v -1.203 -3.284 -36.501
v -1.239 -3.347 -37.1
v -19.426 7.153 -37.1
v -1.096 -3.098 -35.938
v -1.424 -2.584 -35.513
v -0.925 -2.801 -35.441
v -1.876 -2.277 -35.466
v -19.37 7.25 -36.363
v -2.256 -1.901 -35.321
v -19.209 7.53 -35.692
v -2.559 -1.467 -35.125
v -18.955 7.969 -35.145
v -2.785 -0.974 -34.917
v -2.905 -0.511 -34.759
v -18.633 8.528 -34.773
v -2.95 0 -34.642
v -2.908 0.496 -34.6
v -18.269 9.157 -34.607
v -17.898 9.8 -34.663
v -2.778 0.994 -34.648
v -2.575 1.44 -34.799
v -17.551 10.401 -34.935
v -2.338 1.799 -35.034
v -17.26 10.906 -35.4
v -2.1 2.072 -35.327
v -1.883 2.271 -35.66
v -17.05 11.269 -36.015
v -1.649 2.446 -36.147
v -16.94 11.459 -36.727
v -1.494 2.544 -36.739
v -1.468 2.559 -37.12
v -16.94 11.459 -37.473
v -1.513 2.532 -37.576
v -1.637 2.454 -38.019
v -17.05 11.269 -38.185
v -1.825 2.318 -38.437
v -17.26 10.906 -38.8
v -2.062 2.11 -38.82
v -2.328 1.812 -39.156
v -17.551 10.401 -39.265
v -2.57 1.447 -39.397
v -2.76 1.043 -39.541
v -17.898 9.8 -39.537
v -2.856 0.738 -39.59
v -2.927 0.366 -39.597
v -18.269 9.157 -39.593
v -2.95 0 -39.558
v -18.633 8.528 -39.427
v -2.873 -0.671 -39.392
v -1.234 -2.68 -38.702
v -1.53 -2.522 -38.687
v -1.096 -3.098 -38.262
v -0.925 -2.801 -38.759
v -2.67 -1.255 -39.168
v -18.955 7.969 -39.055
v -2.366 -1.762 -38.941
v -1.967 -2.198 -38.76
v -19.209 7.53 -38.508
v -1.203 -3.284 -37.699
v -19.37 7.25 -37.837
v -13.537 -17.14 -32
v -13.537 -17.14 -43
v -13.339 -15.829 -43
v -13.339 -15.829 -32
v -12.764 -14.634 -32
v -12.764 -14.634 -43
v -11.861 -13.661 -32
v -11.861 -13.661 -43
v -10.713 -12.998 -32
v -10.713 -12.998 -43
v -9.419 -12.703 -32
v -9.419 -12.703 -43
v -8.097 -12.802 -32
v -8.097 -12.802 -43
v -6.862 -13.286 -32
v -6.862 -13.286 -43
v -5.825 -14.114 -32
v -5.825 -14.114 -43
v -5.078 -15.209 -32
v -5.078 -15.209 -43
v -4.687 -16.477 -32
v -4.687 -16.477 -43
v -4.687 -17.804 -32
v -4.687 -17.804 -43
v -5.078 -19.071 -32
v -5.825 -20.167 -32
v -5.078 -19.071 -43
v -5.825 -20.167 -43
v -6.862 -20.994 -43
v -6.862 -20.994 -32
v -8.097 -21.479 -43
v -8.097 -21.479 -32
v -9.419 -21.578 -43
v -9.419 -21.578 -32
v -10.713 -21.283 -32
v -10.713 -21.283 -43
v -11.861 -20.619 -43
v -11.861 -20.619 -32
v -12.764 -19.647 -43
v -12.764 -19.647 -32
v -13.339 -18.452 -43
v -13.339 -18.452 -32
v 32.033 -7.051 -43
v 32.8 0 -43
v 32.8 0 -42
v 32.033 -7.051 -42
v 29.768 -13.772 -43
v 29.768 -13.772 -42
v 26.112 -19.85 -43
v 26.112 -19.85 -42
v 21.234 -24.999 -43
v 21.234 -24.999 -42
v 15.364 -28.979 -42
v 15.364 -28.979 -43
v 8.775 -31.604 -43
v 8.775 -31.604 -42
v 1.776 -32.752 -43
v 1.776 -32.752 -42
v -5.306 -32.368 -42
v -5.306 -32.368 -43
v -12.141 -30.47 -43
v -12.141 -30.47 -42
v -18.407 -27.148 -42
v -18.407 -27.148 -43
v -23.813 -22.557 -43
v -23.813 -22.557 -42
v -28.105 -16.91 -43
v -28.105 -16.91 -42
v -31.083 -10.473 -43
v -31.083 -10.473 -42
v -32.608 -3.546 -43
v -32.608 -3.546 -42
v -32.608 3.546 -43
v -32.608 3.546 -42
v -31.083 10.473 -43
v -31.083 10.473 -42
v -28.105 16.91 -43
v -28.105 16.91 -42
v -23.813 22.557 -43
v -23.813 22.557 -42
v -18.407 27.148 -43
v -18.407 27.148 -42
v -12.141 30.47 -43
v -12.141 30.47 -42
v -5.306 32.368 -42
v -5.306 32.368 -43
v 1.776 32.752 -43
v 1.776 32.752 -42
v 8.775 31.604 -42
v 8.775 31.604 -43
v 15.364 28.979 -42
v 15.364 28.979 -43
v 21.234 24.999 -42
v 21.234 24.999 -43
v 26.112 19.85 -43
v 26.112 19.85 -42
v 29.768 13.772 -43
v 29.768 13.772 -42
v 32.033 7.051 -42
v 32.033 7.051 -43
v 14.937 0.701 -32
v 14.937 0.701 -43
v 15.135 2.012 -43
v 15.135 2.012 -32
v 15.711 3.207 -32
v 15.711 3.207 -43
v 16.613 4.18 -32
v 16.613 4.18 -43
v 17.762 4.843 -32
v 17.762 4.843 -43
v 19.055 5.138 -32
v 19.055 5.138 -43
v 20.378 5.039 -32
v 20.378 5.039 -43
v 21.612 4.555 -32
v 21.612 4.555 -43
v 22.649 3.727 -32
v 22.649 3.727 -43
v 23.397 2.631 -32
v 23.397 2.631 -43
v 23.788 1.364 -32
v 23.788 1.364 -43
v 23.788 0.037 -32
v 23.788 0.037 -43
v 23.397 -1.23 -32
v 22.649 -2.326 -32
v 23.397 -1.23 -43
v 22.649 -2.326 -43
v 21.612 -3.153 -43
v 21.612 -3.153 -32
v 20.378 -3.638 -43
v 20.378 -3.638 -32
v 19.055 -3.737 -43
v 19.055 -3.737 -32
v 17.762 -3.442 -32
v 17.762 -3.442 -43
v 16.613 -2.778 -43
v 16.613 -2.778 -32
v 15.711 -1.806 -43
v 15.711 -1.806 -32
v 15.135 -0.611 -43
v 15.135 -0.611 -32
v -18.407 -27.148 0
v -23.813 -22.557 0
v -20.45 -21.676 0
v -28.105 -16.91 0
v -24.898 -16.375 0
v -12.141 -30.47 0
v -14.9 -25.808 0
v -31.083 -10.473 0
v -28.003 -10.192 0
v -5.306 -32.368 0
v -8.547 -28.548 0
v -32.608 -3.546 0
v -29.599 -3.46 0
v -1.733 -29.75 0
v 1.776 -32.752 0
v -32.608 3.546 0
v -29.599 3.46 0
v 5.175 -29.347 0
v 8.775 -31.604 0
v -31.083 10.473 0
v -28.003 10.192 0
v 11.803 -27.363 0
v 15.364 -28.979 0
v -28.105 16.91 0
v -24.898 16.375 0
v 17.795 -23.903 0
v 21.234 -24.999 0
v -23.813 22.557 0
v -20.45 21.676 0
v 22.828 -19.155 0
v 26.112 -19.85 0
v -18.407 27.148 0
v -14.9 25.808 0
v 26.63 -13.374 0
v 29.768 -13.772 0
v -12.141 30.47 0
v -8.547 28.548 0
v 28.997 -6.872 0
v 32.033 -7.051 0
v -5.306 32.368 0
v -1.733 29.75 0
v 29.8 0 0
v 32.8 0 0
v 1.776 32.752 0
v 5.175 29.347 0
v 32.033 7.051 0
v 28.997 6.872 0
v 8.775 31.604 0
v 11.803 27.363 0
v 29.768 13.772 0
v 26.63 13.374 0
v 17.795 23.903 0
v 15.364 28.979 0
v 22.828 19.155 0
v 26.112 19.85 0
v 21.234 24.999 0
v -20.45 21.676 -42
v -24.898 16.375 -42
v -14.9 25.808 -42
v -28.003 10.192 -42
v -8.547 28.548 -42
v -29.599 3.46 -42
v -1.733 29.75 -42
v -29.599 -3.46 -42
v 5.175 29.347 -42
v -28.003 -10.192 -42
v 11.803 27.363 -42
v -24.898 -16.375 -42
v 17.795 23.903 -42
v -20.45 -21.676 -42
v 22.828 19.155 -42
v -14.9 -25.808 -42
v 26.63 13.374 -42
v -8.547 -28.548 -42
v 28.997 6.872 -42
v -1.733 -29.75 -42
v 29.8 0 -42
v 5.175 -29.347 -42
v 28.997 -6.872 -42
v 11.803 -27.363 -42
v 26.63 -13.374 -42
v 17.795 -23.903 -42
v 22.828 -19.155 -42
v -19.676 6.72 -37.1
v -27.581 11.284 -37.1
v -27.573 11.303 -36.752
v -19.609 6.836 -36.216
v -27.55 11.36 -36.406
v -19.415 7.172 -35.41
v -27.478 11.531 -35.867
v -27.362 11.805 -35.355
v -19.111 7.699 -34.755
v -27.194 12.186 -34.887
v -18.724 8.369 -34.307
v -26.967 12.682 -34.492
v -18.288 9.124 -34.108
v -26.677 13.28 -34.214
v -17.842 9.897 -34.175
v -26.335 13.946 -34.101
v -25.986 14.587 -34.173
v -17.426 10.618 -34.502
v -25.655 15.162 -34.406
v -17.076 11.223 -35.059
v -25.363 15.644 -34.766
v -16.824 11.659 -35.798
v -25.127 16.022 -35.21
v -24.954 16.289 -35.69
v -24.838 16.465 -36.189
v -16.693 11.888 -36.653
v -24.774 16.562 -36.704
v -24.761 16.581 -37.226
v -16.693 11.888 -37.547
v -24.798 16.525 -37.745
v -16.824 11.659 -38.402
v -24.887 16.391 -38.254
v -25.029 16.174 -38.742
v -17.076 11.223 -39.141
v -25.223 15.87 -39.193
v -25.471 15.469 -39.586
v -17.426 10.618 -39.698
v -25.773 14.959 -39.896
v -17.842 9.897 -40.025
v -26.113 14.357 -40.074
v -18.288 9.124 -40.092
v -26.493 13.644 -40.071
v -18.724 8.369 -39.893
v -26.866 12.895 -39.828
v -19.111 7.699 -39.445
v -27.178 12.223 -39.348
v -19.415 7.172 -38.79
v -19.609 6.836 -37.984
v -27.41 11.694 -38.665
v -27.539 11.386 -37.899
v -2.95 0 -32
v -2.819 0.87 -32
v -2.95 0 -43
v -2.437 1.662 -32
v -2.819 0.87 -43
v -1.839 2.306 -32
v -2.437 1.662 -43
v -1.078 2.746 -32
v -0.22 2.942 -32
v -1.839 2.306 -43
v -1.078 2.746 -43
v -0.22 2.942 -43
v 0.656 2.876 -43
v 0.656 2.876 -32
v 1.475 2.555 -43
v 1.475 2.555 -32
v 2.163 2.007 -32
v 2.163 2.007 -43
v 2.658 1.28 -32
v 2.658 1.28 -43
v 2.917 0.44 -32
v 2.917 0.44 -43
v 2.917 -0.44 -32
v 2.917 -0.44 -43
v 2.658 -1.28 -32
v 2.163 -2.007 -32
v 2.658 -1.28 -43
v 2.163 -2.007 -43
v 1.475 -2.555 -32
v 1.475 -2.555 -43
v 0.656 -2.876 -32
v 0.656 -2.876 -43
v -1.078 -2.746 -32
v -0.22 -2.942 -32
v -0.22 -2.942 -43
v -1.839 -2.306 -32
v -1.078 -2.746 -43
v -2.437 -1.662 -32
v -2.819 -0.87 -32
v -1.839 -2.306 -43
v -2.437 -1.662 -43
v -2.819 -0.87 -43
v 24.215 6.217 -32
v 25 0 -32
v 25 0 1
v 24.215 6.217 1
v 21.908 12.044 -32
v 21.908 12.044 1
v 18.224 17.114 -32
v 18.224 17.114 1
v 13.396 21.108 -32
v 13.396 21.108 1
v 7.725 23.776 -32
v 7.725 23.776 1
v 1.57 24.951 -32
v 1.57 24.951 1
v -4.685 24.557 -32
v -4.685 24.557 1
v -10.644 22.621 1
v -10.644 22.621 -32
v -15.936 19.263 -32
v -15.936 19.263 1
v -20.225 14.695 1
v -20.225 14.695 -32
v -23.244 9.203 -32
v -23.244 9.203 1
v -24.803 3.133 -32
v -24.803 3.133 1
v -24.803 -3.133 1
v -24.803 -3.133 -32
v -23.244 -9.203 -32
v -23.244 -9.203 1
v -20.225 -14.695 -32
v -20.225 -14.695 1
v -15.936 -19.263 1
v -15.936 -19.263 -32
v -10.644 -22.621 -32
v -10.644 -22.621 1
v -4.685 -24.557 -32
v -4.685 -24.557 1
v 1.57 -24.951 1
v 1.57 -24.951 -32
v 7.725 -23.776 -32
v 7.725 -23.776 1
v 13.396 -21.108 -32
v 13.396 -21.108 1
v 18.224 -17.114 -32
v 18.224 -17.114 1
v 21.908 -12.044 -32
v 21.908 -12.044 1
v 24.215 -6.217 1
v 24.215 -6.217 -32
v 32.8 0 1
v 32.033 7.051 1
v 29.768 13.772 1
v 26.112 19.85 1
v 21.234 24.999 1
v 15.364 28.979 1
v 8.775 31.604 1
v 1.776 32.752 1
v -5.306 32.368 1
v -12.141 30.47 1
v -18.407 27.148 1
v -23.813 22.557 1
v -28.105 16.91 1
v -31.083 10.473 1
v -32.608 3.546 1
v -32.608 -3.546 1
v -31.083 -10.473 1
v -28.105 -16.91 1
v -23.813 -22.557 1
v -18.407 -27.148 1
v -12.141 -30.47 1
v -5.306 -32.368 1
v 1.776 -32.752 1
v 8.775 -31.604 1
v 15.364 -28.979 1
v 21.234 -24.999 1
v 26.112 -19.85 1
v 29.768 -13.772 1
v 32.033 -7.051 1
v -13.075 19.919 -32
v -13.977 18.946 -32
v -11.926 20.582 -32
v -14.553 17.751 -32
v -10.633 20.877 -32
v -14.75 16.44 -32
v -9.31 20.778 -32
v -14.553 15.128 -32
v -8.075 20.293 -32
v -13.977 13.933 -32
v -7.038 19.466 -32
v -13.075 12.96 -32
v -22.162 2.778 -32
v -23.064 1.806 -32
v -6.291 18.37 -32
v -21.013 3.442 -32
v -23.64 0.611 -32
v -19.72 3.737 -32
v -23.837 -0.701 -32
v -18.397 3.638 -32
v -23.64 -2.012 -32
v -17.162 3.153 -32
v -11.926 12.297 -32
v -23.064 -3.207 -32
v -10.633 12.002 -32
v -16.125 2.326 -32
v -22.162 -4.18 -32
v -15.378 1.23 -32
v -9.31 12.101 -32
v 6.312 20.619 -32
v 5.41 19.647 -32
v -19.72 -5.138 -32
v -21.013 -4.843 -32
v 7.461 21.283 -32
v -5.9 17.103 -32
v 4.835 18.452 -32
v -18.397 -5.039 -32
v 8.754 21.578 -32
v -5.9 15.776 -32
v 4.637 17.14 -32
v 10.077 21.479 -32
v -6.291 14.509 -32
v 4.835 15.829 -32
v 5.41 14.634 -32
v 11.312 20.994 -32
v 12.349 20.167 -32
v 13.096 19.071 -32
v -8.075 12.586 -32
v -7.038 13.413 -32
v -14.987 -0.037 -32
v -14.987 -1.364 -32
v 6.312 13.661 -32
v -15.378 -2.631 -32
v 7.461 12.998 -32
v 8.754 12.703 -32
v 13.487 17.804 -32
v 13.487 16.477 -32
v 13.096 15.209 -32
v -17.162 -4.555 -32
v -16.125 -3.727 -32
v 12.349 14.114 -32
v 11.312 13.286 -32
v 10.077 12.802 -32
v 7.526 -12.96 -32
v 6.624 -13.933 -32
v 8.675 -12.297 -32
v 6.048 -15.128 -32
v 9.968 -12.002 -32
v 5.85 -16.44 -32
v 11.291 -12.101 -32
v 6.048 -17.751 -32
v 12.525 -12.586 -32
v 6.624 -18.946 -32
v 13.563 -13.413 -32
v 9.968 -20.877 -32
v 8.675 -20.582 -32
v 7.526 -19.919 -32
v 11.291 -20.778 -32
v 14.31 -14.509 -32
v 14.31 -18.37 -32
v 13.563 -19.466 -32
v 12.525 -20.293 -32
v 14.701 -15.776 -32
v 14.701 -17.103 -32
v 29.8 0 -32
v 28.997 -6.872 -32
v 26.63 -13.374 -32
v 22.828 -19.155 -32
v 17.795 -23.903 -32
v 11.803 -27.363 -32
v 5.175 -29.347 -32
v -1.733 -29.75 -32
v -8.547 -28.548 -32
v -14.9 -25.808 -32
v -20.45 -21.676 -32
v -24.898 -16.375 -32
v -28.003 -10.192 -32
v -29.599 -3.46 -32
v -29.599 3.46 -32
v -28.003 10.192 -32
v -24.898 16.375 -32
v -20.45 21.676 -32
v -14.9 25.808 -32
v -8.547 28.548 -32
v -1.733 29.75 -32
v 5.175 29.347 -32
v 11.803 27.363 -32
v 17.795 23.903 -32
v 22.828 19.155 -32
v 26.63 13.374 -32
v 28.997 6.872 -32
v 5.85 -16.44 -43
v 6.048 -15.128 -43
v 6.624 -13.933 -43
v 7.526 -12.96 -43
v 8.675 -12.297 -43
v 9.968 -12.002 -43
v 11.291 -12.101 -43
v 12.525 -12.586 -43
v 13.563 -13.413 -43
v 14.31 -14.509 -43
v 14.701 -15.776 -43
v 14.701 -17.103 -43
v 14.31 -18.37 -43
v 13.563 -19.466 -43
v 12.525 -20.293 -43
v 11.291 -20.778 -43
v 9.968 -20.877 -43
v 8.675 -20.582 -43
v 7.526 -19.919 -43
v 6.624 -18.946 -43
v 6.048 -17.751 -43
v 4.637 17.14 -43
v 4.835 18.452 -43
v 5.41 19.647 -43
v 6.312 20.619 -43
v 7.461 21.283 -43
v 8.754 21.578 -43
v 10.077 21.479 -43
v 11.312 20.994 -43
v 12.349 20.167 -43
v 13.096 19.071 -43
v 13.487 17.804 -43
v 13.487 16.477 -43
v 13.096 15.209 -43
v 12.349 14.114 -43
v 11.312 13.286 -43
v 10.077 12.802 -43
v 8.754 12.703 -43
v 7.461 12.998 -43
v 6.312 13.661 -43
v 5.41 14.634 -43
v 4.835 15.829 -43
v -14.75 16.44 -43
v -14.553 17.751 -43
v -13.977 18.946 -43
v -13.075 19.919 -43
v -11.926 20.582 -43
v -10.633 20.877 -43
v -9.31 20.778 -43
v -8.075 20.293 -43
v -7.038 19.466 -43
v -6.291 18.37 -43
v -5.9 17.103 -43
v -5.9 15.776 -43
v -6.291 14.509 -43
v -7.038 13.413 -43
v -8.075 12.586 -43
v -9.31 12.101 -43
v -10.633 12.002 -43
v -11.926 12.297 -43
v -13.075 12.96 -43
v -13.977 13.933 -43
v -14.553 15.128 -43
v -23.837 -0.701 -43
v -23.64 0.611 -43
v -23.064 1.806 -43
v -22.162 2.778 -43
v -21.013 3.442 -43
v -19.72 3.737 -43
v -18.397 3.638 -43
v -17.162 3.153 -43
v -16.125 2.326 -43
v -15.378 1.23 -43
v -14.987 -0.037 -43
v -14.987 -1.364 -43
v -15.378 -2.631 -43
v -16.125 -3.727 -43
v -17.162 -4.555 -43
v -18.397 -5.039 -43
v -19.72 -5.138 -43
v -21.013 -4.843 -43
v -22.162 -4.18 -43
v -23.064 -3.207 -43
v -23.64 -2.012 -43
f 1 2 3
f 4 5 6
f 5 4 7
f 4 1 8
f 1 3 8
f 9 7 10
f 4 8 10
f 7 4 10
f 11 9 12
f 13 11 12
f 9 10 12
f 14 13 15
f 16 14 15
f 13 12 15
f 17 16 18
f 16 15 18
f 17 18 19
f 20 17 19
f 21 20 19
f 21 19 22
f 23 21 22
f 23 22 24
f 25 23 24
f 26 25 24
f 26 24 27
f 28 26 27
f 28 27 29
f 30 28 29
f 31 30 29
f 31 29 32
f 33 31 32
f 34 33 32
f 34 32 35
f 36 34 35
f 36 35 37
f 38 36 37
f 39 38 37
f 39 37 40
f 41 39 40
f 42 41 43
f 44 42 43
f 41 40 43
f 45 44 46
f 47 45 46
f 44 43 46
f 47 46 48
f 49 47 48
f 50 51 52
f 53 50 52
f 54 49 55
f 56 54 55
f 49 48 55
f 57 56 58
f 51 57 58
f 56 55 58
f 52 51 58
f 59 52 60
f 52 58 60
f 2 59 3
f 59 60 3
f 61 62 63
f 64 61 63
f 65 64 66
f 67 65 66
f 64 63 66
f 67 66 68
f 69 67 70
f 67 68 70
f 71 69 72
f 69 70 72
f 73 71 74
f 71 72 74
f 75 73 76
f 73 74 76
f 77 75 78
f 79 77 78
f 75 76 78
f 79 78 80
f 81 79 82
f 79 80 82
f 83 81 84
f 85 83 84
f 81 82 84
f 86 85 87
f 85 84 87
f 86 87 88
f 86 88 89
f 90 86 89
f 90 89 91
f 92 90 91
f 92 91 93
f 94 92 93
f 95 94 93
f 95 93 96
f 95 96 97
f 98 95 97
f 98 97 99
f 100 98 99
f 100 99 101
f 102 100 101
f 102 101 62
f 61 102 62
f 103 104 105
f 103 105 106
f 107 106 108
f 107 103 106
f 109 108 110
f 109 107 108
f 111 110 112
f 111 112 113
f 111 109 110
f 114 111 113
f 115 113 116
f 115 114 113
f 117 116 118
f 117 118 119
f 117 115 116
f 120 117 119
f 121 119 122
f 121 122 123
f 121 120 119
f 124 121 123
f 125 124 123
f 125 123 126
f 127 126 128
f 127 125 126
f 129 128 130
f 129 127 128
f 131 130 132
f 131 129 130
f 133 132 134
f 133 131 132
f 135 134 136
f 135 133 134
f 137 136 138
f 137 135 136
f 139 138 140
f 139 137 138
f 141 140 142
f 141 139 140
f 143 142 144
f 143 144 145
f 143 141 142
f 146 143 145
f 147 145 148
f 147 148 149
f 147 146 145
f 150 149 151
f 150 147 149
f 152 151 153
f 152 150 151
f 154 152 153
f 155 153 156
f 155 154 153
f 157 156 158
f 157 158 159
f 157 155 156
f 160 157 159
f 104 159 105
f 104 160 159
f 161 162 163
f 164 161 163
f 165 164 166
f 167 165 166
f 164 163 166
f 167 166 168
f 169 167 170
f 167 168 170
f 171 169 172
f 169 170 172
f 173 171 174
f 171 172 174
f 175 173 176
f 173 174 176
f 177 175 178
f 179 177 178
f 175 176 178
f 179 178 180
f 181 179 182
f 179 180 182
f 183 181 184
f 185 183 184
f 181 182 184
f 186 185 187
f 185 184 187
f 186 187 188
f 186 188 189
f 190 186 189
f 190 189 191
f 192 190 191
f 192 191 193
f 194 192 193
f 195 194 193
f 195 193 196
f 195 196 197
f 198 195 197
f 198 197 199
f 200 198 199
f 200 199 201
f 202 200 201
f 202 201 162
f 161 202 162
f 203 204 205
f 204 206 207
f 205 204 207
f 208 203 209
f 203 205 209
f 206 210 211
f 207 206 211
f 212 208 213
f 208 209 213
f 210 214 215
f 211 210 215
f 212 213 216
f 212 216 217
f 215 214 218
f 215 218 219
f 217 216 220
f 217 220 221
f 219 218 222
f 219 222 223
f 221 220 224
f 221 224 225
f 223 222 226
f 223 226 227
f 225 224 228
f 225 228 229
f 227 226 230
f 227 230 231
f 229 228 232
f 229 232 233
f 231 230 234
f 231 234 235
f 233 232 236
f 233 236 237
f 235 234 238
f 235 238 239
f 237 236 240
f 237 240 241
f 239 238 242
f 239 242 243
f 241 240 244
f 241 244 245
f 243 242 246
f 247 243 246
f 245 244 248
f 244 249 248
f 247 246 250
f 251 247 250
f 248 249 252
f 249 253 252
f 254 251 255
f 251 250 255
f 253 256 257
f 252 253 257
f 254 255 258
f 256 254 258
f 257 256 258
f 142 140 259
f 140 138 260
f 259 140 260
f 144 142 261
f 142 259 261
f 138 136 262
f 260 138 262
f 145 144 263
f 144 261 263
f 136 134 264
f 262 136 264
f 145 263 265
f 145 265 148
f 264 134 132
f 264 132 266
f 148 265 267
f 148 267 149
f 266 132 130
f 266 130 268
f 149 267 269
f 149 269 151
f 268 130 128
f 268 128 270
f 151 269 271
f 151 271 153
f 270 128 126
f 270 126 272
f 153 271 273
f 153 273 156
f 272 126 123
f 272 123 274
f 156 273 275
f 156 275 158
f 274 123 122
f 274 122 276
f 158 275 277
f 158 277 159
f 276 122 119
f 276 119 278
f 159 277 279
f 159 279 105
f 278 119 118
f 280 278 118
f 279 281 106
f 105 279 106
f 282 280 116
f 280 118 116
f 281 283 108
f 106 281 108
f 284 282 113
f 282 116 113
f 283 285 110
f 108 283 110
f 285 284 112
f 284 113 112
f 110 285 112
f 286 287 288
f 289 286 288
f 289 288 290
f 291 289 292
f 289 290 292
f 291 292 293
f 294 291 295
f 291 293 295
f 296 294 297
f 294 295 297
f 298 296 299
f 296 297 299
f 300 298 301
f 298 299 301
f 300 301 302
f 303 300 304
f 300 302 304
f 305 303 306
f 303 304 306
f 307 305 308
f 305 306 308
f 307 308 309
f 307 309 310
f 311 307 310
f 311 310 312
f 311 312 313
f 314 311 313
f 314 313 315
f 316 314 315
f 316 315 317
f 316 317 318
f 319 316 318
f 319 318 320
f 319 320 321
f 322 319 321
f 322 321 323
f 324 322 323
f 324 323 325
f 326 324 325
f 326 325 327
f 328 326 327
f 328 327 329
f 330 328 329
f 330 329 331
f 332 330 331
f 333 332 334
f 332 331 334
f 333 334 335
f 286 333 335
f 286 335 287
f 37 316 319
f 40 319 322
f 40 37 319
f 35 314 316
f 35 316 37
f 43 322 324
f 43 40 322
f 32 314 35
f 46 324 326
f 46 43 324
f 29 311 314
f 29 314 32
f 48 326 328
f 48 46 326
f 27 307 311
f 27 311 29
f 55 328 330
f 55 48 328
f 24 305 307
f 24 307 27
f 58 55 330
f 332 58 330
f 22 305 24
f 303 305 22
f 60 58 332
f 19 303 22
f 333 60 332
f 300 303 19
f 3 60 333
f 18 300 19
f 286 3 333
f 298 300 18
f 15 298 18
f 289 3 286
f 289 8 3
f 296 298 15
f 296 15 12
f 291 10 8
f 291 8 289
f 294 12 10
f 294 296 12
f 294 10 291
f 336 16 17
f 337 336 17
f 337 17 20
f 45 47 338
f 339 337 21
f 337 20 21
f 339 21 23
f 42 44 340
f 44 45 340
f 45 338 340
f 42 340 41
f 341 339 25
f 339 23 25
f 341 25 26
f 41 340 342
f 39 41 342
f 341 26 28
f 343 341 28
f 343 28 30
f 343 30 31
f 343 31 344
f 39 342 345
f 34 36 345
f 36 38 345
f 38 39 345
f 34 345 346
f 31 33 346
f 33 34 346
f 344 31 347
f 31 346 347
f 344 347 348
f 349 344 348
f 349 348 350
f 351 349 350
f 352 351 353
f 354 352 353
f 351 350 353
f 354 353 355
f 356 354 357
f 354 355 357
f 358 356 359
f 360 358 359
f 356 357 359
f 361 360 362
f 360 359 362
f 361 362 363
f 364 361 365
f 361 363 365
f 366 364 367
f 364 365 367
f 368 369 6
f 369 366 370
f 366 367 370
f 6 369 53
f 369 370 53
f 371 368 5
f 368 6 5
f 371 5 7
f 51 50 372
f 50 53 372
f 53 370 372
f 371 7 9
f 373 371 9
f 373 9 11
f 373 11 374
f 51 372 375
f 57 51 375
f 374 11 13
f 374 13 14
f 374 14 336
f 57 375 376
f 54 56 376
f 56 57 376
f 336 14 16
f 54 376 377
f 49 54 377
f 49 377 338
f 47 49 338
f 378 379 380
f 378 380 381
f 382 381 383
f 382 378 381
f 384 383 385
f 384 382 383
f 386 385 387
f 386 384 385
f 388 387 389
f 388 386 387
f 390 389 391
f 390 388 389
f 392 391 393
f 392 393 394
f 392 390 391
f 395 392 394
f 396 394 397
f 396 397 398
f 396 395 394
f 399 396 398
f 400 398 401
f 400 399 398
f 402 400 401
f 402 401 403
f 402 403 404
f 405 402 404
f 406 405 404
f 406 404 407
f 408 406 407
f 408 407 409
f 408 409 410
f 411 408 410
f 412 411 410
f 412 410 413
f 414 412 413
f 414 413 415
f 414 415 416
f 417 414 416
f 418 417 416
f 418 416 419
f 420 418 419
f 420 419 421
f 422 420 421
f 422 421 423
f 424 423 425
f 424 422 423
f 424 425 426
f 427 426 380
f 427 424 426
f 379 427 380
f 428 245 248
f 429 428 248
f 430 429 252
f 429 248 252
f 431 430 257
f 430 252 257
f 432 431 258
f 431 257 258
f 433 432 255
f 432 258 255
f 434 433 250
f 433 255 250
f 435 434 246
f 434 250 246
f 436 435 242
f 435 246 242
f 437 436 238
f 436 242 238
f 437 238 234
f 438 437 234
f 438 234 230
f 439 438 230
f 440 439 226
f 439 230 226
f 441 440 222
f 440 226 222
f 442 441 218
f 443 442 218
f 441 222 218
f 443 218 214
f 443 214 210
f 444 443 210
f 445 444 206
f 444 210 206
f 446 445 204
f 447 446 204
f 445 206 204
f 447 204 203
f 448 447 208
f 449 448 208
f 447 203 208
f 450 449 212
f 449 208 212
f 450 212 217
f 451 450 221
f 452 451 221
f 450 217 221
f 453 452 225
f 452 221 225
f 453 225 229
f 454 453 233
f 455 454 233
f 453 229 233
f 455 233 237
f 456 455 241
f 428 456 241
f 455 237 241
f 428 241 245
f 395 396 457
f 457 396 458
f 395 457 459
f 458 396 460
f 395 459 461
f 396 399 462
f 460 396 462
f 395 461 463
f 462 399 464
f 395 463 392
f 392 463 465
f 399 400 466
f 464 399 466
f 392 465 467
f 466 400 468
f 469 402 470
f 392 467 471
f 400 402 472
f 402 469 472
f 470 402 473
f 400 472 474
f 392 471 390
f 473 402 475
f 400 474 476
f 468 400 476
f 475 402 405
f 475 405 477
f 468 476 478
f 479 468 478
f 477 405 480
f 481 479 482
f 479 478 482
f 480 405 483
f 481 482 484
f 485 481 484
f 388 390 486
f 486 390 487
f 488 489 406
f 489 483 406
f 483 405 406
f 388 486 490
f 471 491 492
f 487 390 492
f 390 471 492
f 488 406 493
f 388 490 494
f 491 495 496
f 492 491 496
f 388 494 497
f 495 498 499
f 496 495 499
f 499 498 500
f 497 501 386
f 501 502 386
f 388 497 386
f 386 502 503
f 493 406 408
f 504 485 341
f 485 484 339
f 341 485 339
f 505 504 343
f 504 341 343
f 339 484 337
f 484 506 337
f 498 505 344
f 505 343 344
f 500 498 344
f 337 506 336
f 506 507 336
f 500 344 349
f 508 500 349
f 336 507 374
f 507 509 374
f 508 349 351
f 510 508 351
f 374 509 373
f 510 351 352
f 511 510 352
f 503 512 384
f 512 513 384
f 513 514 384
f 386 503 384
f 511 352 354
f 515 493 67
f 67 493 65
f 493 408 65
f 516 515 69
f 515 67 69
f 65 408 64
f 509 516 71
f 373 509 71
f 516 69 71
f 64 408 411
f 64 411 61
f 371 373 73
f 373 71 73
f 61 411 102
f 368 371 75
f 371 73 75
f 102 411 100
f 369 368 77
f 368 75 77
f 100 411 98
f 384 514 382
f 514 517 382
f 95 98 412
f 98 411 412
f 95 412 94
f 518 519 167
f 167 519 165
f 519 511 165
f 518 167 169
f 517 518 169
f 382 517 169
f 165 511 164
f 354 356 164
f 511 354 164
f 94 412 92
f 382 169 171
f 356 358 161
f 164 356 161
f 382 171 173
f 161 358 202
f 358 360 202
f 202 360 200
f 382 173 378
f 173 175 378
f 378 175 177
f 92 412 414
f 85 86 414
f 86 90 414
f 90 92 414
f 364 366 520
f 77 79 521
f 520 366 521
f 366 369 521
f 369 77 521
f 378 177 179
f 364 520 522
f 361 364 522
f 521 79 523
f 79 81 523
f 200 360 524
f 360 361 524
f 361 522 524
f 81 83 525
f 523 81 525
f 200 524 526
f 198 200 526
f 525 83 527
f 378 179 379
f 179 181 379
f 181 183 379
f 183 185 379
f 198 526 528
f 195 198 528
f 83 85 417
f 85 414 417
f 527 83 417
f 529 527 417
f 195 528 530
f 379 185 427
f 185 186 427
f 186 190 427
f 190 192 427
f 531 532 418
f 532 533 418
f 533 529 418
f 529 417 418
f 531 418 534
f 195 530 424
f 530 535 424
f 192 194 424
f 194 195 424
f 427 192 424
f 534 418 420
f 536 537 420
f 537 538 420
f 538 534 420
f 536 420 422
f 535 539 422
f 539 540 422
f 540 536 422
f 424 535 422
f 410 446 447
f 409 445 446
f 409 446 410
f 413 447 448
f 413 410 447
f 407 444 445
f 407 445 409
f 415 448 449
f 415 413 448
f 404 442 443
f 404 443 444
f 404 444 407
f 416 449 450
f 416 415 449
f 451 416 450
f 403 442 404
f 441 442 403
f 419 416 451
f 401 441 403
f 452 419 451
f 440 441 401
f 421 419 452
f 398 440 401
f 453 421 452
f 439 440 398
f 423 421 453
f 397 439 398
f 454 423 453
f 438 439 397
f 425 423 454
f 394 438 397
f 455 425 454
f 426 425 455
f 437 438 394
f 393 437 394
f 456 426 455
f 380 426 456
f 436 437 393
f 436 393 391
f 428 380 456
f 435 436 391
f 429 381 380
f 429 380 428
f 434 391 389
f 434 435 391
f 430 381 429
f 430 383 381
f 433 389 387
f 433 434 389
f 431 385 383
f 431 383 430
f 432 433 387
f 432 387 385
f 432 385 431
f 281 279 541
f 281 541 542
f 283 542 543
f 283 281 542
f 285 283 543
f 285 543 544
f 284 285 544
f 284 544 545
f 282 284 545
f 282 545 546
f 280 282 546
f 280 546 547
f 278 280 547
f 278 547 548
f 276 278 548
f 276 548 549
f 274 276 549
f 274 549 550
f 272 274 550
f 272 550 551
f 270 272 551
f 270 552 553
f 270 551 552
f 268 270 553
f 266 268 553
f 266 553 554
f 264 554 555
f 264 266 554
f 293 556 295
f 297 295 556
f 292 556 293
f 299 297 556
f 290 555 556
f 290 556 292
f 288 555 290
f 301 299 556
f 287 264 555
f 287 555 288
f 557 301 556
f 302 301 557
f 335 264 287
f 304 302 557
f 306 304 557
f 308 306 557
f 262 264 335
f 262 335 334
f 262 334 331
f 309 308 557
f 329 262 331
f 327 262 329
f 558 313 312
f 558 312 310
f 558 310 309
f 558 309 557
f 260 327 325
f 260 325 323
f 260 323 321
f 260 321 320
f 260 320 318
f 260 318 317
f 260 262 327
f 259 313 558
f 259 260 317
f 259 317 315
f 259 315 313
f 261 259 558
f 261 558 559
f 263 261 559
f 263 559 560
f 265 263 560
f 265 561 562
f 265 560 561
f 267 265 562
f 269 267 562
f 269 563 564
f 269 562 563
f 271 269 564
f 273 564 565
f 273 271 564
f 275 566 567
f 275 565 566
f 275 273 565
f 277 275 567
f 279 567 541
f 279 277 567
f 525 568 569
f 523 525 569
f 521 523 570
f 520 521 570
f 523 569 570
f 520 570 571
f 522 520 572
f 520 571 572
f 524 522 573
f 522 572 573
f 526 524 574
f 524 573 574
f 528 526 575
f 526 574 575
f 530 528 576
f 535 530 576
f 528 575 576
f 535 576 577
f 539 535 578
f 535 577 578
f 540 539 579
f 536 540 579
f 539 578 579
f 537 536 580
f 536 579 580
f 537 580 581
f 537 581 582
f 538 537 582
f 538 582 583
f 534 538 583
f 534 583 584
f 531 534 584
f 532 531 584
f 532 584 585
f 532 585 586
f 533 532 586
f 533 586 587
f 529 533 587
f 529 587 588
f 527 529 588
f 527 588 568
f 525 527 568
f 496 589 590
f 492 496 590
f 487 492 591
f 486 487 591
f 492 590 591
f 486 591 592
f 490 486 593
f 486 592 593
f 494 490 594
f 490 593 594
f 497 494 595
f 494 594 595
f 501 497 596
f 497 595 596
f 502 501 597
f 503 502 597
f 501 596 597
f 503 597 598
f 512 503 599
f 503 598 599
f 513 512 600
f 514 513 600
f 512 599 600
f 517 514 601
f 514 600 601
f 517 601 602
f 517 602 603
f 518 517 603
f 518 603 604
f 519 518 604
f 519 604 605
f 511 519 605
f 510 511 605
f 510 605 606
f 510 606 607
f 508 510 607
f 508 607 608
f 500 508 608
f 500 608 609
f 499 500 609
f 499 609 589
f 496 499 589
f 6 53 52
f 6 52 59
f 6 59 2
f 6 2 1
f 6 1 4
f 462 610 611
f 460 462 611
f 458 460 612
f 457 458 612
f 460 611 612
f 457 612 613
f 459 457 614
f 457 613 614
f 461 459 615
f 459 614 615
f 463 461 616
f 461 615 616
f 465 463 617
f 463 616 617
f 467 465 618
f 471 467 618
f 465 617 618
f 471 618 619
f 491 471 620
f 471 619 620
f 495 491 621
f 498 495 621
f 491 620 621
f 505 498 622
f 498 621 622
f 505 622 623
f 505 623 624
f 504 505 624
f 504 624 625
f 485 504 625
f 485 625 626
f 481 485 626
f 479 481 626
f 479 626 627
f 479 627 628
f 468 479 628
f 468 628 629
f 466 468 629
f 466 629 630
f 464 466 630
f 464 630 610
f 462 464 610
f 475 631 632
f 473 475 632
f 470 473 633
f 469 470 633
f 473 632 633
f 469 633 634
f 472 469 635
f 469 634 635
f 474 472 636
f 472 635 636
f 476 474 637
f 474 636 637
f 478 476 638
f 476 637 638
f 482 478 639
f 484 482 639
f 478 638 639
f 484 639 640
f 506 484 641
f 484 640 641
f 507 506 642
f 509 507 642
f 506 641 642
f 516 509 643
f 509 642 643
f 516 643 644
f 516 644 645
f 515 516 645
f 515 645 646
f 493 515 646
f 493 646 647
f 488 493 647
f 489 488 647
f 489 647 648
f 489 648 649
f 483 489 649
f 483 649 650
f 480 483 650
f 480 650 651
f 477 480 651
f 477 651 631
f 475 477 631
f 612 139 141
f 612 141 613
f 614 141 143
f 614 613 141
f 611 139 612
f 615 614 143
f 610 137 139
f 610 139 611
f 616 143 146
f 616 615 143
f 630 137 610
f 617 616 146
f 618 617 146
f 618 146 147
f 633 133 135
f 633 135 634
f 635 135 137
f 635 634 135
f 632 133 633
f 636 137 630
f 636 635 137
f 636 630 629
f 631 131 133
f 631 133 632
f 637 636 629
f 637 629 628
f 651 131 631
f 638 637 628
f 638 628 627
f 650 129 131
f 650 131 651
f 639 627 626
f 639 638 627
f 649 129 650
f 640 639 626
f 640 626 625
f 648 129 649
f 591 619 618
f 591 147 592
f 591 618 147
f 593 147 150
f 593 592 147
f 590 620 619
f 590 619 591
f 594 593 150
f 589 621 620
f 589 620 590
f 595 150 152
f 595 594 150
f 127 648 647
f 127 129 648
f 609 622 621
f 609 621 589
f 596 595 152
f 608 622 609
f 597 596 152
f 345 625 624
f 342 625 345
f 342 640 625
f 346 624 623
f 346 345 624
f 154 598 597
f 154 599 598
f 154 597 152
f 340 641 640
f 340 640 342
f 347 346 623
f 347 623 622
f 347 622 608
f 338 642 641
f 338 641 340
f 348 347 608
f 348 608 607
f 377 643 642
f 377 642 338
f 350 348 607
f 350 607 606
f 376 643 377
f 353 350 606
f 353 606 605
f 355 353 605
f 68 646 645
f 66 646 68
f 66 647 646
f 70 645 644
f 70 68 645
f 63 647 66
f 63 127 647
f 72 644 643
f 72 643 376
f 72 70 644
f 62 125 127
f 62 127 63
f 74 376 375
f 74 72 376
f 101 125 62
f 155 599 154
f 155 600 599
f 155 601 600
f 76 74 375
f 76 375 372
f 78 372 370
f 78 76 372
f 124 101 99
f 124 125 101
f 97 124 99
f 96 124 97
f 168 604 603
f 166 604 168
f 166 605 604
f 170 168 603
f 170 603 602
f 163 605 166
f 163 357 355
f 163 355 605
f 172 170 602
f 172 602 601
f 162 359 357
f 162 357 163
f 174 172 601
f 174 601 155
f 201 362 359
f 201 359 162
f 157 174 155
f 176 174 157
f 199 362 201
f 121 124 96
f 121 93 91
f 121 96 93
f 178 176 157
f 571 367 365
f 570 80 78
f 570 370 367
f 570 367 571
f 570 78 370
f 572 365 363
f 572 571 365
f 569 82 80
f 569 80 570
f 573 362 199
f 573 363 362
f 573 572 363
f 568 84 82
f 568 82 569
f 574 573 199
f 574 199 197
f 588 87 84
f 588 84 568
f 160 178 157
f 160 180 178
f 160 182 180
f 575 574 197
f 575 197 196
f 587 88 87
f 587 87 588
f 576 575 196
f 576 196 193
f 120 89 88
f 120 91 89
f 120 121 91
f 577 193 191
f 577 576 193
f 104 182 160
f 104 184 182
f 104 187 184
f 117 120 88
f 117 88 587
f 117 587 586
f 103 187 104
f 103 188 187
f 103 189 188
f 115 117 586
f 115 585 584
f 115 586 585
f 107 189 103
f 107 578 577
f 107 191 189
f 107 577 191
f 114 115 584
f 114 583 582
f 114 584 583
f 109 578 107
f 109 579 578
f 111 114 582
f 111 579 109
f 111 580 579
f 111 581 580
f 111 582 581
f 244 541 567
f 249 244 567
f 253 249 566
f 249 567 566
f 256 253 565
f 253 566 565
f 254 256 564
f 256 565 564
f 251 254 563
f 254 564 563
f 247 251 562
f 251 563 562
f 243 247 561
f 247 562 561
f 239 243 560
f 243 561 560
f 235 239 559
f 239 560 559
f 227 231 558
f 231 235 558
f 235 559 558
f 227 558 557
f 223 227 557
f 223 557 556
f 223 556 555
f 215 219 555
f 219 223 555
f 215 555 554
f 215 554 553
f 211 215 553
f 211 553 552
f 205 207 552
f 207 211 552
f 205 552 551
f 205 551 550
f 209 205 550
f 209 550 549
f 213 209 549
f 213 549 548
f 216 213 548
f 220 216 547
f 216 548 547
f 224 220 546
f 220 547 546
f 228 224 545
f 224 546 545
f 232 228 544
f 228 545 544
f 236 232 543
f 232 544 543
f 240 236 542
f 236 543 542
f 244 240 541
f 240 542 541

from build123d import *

# Parameters (mm, degrees)
SKETCH1_R           = 32.8
SKETCH1_R_2         = 25
BOSS_EXTRUDE1_DEPTH = 1
BOSS_EXTRUDE2_START = -33
SKETCH2_R           = 29.8
SKETCH2_R_2         = 25
BOSS_EXTRUDE2_DEPTH = 33
BOSS_EXTRUDE3_START = 10
SKETCH3_R           = 29.8
BOSS_EXTRUDE3_DEPTH = 10
BOSS_EXTRUDE4_START = 1
SKETCH4_R           = 32.8
BOSS_EXTRUDE4_DEPTH = 1
SKETCH5_R           = 2.95
CUT_EXTRUDE1_DEPTH  = 64.934966959
SKETCH6_R           = 4.45
CUT_EXTRUDE2_DEPTH  = 64.934966959
SKETCH7_R           = 3
CUT_EXTRUDE3_DEPTH  = 9.4
SKETCH8_R           = 2.5
CUT_EXTRUDE4_DEPTH  = 21


with BuildPart() as part:
    # Sketch1 → Boss-Extrude1 (new body)
    with BuildSketch(Plane.XY):
        Circle(SKETCH1_R)
        Circle(SKETCH1_R_2, mode=Mode.SUBTRACT)
    extrude(amount=BOSS_EXTRUDE1_DEPTH)

    # Sketch2 → Boss-Extrude2 (add)
    with BuildSketch(Plane.XY.offset(1).offset(BOSS_EXTRUDE2_START)):
        Circle(SKETCH2_R)
        Circle(SKETCH2_R_2, mode=Mode.SUBTRACT)
    extrude(amount=BOSS_EXTRUDE2_DEPTH)

    # Sketch3 → Boss-Extrude3 (add)
    with BuildSketch(Plane(origin=(0, 0, -32), x_dir=(-1, 0, 0), z_dir=(0, 0, -1)).offset(BOSS_EXTRUDE3_START)):
        with Locations(Location((0, 0, 0), (0, 0, 180))):
            Circle(SKETCH3_R)
    extrude(amount=-BOSS_EXTRUDE3_DEPTH)

    # Sketch4 → Boss-Extrude4 (add)
    with BuildSketch(Plane(origin=(0, 0, -42), x_dir=(-1, 0, 0), z_dir=(0, 0, -1)).offset(BOSS_EXTRUDE4_START)):
        with Locations(Location((0, 0, 0), (0, 0, 180))):
            Circle(SKETCH4_R)
    extrude(amount=-BOSS_EXTRUDE4_DEPTH)

    # Sketch5 → Cut-Extrude1 (cut, through all)
    with BuildSketch(Plane(origin=(0, 0, -43), x_dir=(-1, 0, 0), z_dir=(0, 0, -1))):
        Circle(SKETCH5_R)
    extrude(amount=-CUT_EXTRUDE1_DEPTH, mode=Mode.SUBTRACT)

    # Sketch6 → Cut-Extrude2 (cut, through all)
    with BuildSketch(Plane(origin=(0, 0, -43), x_dir=(-1, 0, 0), z_dir=(0, 0, -1))):
        with Locations((10.300490658, 16.439583091)):
            Circle(SKETCH6_R)
        with Locations((19.387341913, -0.700695036)):
            Circle(SKETCH6_R)
        with Locations((9.086851255, -17.140278127)):
            Circle(SKETCH6_R)
        with Locations((-10.300490658, -16.439583091)):
            Circle(SKETCH6_R)
        with Locations((-19.387341913, 0.700695036)):
            Circle(SKETCH6_R)
        with Locations((-9.086851255, 17.140278127)):
            Circle(SKETCH6_R)
    extrude(amount=-CUT_EXTRUDE2_DEPTH, mode=Mode.SUBTRACT)

    # Sketch7 → Cut-Extrude3 (cut)
    with BuildSketch(Plane(origin=(-25.807557033, 14.9, 0), x_dir=(0, 0, 1), z_dir=(-0.8660254037844398, 0.499999999999998, 0))):
        with Locations(Location((-37.1, -1.017819827, 0), (0, 0, 270))):
            Circle(SKETCH7_R)
    extrude(amount=-CUT_EXTRUDE3_DEPTH, mode=Mode.SUBTRACT)

    # Sketch8 → Cut-Extrude4 (cut)
    with BuildSketch(Plane(origin=(-17.666918237, 10.2, 0), x_dir=(0, 0, 1), z_dir=(-0.8660254037844398, 0.49999999999999806, 0))):
        with Locations(Location((-37.1, -1.017819827, 0), (0, 0, 270))):
            Circle(SKETCH8_R)
    extrude(amount=-CUT_EXTRUDE4_DEPTH, mode=Mode.SUBTRACT)


solid = part.part
